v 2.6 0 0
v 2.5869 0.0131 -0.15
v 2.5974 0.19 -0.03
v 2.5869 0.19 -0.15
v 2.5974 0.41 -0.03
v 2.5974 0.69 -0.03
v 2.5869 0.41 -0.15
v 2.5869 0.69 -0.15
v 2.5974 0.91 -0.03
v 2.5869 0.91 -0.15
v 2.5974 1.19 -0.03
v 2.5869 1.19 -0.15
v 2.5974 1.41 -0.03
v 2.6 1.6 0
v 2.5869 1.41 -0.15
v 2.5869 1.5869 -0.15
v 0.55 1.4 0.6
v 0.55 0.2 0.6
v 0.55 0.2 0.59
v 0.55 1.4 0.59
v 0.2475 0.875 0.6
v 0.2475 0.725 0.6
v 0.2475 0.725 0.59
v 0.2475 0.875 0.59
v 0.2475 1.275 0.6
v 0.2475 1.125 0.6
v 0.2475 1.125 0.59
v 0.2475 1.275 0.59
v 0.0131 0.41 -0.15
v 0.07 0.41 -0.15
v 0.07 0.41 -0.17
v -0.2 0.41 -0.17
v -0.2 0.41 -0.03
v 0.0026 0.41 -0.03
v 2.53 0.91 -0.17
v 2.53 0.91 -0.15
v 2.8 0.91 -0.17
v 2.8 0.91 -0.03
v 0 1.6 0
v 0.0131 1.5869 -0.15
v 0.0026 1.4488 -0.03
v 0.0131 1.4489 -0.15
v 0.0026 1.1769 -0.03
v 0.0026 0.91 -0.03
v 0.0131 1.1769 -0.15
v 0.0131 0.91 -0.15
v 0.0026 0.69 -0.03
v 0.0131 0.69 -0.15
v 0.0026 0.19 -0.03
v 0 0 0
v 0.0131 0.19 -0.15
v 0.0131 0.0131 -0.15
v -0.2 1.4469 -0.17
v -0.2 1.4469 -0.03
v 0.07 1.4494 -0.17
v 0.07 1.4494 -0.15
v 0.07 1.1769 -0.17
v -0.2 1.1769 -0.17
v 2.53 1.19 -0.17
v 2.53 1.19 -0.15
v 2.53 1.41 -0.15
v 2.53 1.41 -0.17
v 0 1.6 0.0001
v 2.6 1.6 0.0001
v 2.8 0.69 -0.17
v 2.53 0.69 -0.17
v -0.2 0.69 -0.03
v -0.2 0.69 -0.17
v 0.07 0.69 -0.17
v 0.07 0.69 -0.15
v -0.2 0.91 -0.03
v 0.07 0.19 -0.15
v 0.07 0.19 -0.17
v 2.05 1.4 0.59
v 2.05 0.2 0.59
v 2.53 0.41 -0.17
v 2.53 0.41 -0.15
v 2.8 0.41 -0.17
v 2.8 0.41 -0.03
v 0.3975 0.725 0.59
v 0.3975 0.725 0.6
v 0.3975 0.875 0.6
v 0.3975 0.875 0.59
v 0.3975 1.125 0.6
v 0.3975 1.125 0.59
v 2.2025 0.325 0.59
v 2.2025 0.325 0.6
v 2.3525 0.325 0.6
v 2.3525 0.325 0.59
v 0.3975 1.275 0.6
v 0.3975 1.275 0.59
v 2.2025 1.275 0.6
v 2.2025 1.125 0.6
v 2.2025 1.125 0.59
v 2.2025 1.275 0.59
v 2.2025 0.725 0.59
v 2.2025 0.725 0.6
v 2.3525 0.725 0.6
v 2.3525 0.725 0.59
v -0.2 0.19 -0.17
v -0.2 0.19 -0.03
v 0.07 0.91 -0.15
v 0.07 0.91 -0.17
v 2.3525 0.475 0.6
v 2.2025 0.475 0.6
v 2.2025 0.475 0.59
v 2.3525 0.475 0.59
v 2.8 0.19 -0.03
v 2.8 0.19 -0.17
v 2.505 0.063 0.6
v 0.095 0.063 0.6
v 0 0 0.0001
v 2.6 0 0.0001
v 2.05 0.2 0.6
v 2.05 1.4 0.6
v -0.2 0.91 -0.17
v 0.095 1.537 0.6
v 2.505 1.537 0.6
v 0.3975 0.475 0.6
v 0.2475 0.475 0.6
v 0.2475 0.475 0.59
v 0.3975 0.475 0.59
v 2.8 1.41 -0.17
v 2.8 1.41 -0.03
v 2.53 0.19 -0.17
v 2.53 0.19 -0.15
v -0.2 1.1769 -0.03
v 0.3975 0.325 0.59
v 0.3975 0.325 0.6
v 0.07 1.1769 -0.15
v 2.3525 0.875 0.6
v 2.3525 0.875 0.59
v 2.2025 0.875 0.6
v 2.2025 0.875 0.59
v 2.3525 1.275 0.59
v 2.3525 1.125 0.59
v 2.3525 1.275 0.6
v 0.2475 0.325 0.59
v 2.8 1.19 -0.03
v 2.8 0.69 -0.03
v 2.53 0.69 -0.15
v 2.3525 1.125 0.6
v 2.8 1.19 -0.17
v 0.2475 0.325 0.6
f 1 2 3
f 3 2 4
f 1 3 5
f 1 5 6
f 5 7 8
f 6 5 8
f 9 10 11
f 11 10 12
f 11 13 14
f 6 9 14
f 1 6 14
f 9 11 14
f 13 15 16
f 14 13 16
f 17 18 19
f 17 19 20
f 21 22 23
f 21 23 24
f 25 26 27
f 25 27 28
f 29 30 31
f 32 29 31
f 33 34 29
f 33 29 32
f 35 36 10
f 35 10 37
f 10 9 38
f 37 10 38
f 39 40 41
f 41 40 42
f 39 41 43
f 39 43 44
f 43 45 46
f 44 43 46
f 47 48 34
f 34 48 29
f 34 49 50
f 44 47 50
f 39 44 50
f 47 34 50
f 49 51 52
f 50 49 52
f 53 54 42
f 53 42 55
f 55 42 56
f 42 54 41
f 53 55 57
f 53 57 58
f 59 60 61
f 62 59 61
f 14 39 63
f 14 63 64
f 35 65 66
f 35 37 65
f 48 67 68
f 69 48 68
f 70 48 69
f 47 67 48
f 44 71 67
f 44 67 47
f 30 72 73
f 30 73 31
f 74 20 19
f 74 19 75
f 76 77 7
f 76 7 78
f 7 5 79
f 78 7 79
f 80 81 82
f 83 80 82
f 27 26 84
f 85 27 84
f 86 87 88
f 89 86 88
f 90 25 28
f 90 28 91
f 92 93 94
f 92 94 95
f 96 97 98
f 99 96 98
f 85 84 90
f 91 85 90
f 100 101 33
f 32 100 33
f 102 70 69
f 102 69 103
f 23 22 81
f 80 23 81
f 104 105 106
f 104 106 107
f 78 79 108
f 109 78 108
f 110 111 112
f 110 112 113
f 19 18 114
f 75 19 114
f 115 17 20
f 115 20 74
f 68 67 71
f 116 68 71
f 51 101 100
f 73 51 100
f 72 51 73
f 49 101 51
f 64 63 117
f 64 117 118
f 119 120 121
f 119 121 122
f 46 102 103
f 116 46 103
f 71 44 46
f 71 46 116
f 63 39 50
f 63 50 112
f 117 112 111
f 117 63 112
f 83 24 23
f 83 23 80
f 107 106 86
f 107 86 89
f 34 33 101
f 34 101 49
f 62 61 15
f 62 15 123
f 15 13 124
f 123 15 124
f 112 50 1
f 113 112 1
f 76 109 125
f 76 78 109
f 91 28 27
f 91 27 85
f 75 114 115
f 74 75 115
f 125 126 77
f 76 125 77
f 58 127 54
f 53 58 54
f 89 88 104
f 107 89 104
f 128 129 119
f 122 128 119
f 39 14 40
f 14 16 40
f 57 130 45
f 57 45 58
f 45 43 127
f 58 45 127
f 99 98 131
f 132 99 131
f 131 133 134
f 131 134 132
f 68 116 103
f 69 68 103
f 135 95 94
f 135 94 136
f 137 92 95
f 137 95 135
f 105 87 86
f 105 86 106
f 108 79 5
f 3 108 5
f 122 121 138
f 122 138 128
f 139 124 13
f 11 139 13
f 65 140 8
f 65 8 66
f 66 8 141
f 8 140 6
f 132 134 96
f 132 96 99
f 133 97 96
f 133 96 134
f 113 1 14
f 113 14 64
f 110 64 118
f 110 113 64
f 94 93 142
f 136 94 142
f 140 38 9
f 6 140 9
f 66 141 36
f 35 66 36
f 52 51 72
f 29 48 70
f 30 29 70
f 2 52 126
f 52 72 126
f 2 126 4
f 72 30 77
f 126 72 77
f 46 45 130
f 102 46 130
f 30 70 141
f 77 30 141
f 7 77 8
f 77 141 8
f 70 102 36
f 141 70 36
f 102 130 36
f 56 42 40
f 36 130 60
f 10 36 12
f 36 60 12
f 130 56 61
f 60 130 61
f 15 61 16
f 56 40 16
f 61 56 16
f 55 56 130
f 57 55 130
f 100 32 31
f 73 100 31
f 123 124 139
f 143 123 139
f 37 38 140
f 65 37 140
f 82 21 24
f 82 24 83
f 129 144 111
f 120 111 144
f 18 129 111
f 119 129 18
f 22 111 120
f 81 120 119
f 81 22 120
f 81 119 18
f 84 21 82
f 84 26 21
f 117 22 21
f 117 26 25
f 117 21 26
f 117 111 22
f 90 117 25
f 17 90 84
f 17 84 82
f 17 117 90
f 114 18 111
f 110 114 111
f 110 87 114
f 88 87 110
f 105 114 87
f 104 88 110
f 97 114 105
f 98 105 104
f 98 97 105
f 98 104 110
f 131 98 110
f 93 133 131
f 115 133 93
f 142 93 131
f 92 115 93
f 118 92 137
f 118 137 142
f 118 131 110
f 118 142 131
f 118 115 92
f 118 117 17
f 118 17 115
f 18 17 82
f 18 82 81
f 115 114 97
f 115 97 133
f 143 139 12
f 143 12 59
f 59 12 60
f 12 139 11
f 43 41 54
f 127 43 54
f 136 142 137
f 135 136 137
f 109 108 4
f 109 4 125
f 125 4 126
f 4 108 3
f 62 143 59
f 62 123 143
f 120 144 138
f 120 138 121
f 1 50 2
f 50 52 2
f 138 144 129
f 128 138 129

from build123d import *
from OCP.BRepFilletAPI import BRepFilletAPI_MakeChamfer

# Parameters (mm, degrees)
SKETCH_1_W                = 2.6
SKETCH_1_H                = 1.6
EXTRUDE_1_DEPTH           = 0.6
EXTRUDE_1_OTHER_WAY_DEPTH = 0.15
EXTRUDE_1_OTHER_WAY_TAPER = 5
CHAMFER_1_SIZE            = 0.6
CHAMFER_1_SIZE_2          = 0.095030664
CHAMFER_2_SIZE            = 0.6
CHAMFER_2_SIZE_2          = 0.063062541
EXTRUDE_2_DEPTH           = 0.02
EXTRUDE_2_DEPTH_BACK      = 0.12
SKETCH_5_W                = 0.15
SKETCH_5_H                = 0.15
SKETCH_5_W_2              = 1.5
SKETCH_5_H_2              = 1.2
CUT_EXTRUDE_1_DEPTH       = 0.01


# Some blends are built 0.0001 mm under size
with BuildPart() as part:
    # Эскиз1 → Бобышка-Вытянуть1 (new body)
    with BuildSketch(Plane.XY):
        with Locations((1.3, 0.8)):
            Rectangle(SKETCH_1_W, SKETCH_1_H)
    extrude(amount=EXTRUDE_1_DEPTH)

    # Эскиз1 → Бобышка-Вытянуть1 other way (add)
    with BuildSketch(Plane.XY):
        with Locations((1.3, 0.8)):
            Rectangle(SKETCH_1_W, SKETCH_1_H)
    extrude(amount=-EXTRUDE_1_OTHER_WAY_DEPTH, taper=EXTRUDE_1_OTHER_WAY_TAPER)

    # Фаска1
    # the kernel refuses this chamfer: 0.6, 0.095030664 mm, written as the material it takes off along each edge
    with BuildSketch(Plane(origin=(0, 3.15928955, 0.6), x_dir=(-0.006019451551713199, 0, -0.9999818829373943), z_dir=(0, -1, 0)), Plane(origin=(2.6, -1.55928955, 0.6), x_dir=(0.006019451551713157, 0, -0.9999818829373943), z_dir=(0, 1, 0))) as chamfer_1_piece_1:
        Polygon((CHAMFER_1_SIZE * 0.999981882937, CHAMFER_1_SIZE * 0.00601945155171), (-CHAMFER_1_SIZE_2 * 0.00601945156405, CHAMFER_1_SIZE_2 * 0.999981884986), (0, 0), align=None)
    extrude(amount=4.7185791, mode=Mode.SUBTRACT)

    # Фаска2
    chamfer_2_edges_1 = [part.edges().sort_by_distance(p)[0] for p in [
        (1.3, 0, 0.6),
    ]]
    chamfer_2_side_1 = [part.faces().sort_by_distance(p)[0] for p in [
        (1.3, 0, 0.598738749),
    ]]
    chamfer_2_edges_2 = [part.edges().sort_by_distance(p)[0] for p in [
        (1.3, 1.6, 0.6),
    ]]
    chamfer_2_side_2 = [part.faces().sort_by_distance(p)[0] for p in [
        (1.3, 1.598738749, 0.6),
    ]]
    chamfer_2 = BRepFilletAPI_MakeChamfer(part.part.solid().wrapped)
    for e in chamfer_2_edges_1:
        chamfer_2.Add(CHAMFER_2_SIZE - 0.0001, CHAMFER_2_SIZE_2 - 0.0001, e.wrapped, chamfer_2_side_1[0].wrapped)
    for e in chamfer_2_edges_2:
        chamfer_2.Add(CHAMFER_2_SIZE_2 - 0.0001, CHAMFER_2_SIZE - 0.0001, e.wrapped, chamfer_2_side_2[0].wrapped)
    add(Compound.cast(chamfer_2.Shape()), mode=Mode.REPLACE)  # a hair under: the kernel refuses the full size

    # Эскиз4 → Бобышка-Вытянуть2 (add, two sides: drawn at the far end of the back side and taken through both)
    with BuildSketch(Plane(origin=(0, 0, -0.15), x_dir=(-1, 0, 0), z_dir=(0, 0, -1)).offset(-EXTRUDE_2_DEPTH_BACK)):
        Polygon((-2.8, 0.8), (-2.8, 0.69), (-2.53, 0.69), (-2.53, 0.91), (-2.8, 0.91), align=None)
        Polygon((-0.07, 0.41), (0.2, 0.41), (0.2, 0.3), (0.2, 0.19), (-0.07, 0.19), align=None)
        Polygon((-2.8, 0.3), (-2.8, 0.19), (-2.53, 0.19), (-2.53, 0.41), (-2.8, 0.41), align=None)
        Polygon((-0.07, 0.91), (0.2, 0.91), (0.2, 0.8), (0.2, 0.69), (-0.07, 0.69), align=None)
        Polygon((-2.8, 1.3), (-2.8, 1.19), (-2.53, 1.19), (-2.53, 1.41), (-2.8, 1.41), align=None)
        Polygon((-0.07, 1.4493767), (-0.07, 1.1768767), (0.2, 1.1768767), (0.2, 1.3118767), (0.2, 1.4468767), align=None)
    extrude(amount=EXTRUDE_2_DEPTH + EXTRUDE_2_DEPTH_BACK)

    # Эскиз5 → Вырез-Вытянуть1 (cut)
    with BuildSketch(Plane.XY.offset(0.6)):
        with Locations((0.322515332, 1.2)):
            Rectangle(SKETCH_5_W, SKETCH_5_H)
        with Locations((2.277484668, 0.8)):
            Rectangle(SKETCH_5_W, SKETCH_5_H)
        with Locations((1.3, 0.8)):
            Rectangle(SKETCH_5_W_2, SKETCH_5_H_2)
        with Locations((0.322515332, 0.8)):
            Rectangle(SKETCH_5_W, SKETCH_5_H)
        with Locations((0.322515332, 0.4)):
            Rectangle(SKETCH_5_W, SKETCH_5_H)
        with Locations((2.277484668, 0.4)):
            Rectangle(SKETCH_5_W, SKETCH_5_H)
        with Locations((2.277484668, 1.2)):
            Rectangle(SKETCH_5_W, SKETCH_5_H)
    extrude(amount=-CUT_EXTRUDE_1_DEPTH, mode=Mode.SUBTRACT)


solid = part.part
